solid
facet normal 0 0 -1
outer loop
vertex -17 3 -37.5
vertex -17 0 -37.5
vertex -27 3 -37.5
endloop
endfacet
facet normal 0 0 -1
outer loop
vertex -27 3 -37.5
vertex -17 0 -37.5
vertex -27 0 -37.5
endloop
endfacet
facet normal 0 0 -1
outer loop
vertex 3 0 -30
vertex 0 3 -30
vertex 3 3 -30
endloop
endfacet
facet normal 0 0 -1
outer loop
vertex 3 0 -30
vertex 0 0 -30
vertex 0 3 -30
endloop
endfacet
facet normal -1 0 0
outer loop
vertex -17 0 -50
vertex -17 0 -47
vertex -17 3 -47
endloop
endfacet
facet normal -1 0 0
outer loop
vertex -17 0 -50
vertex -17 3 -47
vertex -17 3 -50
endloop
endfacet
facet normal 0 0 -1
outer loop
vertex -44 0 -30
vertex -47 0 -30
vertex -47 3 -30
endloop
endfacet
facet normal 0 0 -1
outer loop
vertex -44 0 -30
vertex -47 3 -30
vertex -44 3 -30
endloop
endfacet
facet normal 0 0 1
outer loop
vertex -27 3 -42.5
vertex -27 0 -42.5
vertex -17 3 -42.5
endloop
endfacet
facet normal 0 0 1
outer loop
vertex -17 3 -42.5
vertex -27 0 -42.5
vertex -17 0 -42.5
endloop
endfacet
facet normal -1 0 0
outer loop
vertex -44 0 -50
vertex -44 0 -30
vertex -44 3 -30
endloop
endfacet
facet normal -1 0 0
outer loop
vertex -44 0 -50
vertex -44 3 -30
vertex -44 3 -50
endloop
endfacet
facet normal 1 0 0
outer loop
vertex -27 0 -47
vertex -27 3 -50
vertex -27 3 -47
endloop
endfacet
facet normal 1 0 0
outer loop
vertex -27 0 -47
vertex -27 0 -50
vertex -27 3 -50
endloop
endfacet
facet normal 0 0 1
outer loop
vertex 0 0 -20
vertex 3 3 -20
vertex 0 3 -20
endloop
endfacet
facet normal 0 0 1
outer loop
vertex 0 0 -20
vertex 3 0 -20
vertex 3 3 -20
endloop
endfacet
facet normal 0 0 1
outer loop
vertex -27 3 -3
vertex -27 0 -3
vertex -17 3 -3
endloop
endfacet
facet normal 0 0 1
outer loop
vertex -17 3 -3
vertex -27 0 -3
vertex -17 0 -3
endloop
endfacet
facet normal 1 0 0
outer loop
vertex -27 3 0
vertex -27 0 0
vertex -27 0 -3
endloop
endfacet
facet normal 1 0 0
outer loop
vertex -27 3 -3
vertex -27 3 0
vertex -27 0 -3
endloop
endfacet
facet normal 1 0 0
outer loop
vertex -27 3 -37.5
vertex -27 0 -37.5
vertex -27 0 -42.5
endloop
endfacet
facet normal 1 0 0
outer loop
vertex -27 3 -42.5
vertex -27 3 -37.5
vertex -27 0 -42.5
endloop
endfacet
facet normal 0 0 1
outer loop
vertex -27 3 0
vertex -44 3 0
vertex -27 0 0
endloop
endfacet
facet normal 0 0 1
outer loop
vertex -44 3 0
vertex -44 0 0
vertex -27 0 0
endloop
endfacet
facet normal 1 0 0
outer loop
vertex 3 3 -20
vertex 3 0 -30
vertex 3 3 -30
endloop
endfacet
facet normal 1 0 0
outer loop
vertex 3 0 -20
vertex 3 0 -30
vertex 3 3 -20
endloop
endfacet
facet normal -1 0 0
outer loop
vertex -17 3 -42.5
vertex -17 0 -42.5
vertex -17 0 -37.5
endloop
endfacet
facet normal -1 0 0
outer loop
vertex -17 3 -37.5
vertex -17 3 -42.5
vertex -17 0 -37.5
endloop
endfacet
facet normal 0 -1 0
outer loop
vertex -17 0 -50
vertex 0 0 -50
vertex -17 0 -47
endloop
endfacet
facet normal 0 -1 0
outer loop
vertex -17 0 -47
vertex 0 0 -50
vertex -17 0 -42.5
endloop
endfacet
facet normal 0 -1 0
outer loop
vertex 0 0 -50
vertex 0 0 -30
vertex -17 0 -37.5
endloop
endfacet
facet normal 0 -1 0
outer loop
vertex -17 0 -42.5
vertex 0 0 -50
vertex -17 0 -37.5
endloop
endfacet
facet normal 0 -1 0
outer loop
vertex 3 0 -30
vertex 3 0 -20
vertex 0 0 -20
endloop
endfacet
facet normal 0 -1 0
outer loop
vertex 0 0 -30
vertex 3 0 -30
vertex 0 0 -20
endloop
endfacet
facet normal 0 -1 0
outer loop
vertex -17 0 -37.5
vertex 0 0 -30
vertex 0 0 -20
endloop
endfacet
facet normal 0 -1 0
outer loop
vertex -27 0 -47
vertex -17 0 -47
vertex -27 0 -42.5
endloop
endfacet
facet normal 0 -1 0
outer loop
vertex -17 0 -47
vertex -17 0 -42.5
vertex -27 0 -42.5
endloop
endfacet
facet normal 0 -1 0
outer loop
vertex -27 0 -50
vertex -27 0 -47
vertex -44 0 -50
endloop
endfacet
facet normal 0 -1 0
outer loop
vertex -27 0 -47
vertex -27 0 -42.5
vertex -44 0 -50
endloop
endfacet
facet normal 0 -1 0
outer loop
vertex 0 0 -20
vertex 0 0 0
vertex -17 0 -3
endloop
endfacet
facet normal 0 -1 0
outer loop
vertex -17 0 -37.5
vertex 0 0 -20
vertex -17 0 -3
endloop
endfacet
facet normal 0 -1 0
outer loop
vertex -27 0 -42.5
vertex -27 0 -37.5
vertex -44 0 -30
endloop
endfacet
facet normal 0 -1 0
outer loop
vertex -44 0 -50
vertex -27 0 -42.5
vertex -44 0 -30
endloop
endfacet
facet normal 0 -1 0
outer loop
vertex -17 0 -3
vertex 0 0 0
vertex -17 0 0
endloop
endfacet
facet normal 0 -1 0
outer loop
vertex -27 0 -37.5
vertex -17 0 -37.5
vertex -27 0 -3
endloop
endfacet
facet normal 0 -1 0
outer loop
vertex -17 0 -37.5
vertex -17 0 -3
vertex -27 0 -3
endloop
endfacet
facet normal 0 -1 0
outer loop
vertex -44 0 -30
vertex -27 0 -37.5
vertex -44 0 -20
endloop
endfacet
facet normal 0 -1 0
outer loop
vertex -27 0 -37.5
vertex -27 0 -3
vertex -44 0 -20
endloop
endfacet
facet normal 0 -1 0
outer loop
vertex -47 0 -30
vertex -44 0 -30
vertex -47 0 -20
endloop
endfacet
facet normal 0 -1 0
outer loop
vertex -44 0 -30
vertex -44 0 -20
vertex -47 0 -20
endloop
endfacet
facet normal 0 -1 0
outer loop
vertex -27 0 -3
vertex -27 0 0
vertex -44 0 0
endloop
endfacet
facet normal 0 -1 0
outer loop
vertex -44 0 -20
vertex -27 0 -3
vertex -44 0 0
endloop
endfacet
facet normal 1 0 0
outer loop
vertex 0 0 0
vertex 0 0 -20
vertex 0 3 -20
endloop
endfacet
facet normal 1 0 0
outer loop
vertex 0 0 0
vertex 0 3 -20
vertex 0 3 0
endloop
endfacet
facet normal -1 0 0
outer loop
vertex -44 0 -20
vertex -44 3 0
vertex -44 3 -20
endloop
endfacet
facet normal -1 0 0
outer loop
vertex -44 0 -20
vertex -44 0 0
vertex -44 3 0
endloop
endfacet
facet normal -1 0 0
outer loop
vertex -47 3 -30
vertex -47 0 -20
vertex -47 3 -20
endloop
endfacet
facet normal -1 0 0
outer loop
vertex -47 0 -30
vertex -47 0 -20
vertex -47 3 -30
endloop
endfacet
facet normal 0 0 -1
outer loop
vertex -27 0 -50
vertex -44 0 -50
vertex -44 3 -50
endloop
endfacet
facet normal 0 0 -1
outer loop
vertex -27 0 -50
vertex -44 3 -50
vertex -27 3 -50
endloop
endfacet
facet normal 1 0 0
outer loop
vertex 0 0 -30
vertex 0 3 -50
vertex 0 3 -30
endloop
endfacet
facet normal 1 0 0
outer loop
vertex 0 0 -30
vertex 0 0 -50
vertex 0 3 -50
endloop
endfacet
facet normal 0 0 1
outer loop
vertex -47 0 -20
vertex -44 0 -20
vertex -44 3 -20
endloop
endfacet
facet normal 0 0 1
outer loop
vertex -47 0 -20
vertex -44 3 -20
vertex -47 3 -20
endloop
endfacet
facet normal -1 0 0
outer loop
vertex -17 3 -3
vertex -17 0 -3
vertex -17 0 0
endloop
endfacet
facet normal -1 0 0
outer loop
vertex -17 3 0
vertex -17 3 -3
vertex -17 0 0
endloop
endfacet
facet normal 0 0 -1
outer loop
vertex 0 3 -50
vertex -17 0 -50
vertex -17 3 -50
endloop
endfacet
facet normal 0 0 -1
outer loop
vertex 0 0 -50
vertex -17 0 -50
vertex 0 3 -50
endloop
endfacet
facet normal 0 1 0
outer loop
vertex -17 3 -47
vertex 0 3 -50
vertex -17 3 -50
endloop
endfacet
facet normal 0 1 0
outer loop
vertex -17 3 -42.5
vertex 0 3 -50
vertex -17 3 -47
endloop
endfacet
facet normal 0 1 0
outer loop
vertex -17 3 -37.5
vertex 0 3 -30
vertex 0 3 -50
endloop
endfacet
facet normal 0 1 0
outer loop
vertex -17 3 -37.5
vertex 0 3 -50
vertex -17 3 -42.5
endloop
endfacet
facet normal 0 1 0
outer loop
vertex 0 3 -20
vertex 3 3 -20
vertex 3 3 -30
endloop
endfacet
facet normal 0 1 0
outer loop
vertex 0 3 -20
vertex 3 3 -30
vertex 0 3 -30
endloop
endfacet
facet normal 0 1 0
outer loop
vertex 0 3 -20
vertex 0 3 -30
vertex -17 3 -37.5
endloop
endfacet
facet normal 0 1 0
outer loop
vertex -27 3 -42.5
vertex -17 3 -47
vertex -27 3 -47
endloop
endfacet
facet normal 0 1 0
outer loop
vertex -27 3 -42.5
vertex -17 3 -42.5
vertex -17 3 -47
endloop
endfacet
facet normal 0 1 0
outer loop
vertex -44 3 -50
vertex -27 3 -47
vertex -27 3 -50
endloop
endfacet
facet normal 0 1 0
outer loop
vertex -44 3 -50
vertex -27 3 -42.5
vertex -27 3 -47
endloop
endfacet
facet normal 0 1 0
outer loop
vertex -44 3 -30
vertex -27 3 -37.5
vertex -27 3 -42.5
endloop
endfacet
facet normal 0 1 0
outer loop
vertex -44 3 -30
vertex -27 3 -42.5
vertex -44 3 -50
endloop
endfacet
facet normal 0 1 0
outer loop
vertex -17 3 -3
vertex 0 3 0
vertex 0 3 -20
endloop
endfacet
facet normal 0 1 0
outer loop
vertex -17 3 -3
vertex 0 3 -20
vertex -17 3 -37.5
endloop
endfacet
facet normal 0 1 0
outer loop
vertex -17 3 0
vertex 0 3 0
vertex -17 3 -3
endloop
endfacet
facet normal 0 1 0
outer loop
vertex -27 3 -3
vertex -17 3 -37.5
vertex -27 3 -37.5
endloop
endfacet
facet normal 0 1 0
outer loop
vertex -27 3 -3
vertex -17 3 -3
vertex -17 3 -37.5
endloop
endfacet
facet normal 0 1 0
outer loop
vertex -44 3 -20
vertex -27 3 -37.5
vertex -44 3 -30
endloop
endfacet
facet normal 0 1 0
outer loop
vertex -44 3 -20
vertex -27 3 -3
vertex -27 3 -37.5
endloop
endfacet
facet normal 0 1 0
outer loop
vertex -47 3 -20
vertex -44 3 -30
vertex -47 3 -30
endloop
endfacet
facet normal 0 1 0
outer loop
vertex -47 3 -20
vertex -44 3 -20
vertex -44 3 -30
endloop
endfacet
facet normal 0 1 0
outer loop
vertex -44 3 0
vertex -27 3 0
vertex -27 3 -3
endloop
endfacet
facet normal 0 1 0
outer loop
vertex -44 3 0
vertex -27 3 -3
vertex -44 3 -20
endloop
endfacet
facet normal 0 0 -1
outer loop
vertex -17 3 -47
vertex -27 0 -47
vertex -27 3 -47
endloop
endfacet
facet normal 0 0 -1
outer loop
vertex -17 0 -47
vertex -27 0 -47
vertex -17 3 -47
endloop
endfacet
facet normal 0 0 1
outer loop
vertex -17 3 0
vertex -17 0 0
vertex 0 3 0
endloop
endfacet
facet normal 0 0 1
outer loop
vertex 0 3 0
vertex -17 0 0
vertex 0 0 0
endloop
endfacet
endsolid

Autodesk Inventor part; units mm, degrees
ref_plane "YZ Plane" through (0, 0, 0) normal (1, 0, 0) x (0, 1, 0)
ref_plane "XZ Plane" through (0, 0, 0) normal (0, 1, 0) x (-1, 0, 0)
ref_plane "XY Plane" through (0, 0, 0) normal (0, 0, 1) x (1, 0, 0)
sketch "Sketch1" plane through (0, 0, 0) normal (0, 1, 0) x (-1, 0, 0)
  line L0 (44, 0) -> (44, -20)
  line L1 (44, -20) -> (47, -20)
  line L2 (47, -20) -> (47, -30)
  line L3 (47, -30) -> (44, -30)
  line L4 (44, -30) -> (44, -50)
  line L5 (44, -50) -> (27, -50)
  line L6 (27, -50) -> (27, -47)
  line L7 (27, -47) -> (17, -47)
  line L8 (17, -47) -> (17, -50)
  line L9 (17, -50) -> (0, -50)
  line L10 (0, -50) -> (0, -30)
  line L11 (0, -30) -> (-3, -30)
  line L12 (-3, -30) -> (-3, -20)
  line L13 (-3, -20) -> (0, -20)
  line L14 (0, -20) -> (0, 0)
  line L15 (44, 0) -> (27, 0)
  line L16 (27, 0) -> (27, -3)
  line L17 (27, -3) -> (17, -3)
  line L18 (17, -3) -> (17, 0)
  line L19 (17, 0) -> (0, 0)
  line L20 (27, -42.5) -> (17, -42.5)
  line L21 (17, -42.5) -> (17, -37.5)
  line L22 (17, -37.5) -> (27, -37.5)
  line L23 (27, -37.5) -> (27, -42.5)
  point P0 (47, -25)
  point P1 (22, -3)
  point P2 (22, -47)
  point P3 (22, -42.5)
  dimension "d0" = 3
  dimension "d1" = 10
  dimension "d2" = 3
  dimension "d3" = 50
  dimension "d4" = 10
  dimension "d5" = 50
  dimension "d7" = 10
  dimension "d8" = 5
  dimension "d9" = 4.5
extrude "Extrusion1" add sketch "Sketch1" along normal blind 3
